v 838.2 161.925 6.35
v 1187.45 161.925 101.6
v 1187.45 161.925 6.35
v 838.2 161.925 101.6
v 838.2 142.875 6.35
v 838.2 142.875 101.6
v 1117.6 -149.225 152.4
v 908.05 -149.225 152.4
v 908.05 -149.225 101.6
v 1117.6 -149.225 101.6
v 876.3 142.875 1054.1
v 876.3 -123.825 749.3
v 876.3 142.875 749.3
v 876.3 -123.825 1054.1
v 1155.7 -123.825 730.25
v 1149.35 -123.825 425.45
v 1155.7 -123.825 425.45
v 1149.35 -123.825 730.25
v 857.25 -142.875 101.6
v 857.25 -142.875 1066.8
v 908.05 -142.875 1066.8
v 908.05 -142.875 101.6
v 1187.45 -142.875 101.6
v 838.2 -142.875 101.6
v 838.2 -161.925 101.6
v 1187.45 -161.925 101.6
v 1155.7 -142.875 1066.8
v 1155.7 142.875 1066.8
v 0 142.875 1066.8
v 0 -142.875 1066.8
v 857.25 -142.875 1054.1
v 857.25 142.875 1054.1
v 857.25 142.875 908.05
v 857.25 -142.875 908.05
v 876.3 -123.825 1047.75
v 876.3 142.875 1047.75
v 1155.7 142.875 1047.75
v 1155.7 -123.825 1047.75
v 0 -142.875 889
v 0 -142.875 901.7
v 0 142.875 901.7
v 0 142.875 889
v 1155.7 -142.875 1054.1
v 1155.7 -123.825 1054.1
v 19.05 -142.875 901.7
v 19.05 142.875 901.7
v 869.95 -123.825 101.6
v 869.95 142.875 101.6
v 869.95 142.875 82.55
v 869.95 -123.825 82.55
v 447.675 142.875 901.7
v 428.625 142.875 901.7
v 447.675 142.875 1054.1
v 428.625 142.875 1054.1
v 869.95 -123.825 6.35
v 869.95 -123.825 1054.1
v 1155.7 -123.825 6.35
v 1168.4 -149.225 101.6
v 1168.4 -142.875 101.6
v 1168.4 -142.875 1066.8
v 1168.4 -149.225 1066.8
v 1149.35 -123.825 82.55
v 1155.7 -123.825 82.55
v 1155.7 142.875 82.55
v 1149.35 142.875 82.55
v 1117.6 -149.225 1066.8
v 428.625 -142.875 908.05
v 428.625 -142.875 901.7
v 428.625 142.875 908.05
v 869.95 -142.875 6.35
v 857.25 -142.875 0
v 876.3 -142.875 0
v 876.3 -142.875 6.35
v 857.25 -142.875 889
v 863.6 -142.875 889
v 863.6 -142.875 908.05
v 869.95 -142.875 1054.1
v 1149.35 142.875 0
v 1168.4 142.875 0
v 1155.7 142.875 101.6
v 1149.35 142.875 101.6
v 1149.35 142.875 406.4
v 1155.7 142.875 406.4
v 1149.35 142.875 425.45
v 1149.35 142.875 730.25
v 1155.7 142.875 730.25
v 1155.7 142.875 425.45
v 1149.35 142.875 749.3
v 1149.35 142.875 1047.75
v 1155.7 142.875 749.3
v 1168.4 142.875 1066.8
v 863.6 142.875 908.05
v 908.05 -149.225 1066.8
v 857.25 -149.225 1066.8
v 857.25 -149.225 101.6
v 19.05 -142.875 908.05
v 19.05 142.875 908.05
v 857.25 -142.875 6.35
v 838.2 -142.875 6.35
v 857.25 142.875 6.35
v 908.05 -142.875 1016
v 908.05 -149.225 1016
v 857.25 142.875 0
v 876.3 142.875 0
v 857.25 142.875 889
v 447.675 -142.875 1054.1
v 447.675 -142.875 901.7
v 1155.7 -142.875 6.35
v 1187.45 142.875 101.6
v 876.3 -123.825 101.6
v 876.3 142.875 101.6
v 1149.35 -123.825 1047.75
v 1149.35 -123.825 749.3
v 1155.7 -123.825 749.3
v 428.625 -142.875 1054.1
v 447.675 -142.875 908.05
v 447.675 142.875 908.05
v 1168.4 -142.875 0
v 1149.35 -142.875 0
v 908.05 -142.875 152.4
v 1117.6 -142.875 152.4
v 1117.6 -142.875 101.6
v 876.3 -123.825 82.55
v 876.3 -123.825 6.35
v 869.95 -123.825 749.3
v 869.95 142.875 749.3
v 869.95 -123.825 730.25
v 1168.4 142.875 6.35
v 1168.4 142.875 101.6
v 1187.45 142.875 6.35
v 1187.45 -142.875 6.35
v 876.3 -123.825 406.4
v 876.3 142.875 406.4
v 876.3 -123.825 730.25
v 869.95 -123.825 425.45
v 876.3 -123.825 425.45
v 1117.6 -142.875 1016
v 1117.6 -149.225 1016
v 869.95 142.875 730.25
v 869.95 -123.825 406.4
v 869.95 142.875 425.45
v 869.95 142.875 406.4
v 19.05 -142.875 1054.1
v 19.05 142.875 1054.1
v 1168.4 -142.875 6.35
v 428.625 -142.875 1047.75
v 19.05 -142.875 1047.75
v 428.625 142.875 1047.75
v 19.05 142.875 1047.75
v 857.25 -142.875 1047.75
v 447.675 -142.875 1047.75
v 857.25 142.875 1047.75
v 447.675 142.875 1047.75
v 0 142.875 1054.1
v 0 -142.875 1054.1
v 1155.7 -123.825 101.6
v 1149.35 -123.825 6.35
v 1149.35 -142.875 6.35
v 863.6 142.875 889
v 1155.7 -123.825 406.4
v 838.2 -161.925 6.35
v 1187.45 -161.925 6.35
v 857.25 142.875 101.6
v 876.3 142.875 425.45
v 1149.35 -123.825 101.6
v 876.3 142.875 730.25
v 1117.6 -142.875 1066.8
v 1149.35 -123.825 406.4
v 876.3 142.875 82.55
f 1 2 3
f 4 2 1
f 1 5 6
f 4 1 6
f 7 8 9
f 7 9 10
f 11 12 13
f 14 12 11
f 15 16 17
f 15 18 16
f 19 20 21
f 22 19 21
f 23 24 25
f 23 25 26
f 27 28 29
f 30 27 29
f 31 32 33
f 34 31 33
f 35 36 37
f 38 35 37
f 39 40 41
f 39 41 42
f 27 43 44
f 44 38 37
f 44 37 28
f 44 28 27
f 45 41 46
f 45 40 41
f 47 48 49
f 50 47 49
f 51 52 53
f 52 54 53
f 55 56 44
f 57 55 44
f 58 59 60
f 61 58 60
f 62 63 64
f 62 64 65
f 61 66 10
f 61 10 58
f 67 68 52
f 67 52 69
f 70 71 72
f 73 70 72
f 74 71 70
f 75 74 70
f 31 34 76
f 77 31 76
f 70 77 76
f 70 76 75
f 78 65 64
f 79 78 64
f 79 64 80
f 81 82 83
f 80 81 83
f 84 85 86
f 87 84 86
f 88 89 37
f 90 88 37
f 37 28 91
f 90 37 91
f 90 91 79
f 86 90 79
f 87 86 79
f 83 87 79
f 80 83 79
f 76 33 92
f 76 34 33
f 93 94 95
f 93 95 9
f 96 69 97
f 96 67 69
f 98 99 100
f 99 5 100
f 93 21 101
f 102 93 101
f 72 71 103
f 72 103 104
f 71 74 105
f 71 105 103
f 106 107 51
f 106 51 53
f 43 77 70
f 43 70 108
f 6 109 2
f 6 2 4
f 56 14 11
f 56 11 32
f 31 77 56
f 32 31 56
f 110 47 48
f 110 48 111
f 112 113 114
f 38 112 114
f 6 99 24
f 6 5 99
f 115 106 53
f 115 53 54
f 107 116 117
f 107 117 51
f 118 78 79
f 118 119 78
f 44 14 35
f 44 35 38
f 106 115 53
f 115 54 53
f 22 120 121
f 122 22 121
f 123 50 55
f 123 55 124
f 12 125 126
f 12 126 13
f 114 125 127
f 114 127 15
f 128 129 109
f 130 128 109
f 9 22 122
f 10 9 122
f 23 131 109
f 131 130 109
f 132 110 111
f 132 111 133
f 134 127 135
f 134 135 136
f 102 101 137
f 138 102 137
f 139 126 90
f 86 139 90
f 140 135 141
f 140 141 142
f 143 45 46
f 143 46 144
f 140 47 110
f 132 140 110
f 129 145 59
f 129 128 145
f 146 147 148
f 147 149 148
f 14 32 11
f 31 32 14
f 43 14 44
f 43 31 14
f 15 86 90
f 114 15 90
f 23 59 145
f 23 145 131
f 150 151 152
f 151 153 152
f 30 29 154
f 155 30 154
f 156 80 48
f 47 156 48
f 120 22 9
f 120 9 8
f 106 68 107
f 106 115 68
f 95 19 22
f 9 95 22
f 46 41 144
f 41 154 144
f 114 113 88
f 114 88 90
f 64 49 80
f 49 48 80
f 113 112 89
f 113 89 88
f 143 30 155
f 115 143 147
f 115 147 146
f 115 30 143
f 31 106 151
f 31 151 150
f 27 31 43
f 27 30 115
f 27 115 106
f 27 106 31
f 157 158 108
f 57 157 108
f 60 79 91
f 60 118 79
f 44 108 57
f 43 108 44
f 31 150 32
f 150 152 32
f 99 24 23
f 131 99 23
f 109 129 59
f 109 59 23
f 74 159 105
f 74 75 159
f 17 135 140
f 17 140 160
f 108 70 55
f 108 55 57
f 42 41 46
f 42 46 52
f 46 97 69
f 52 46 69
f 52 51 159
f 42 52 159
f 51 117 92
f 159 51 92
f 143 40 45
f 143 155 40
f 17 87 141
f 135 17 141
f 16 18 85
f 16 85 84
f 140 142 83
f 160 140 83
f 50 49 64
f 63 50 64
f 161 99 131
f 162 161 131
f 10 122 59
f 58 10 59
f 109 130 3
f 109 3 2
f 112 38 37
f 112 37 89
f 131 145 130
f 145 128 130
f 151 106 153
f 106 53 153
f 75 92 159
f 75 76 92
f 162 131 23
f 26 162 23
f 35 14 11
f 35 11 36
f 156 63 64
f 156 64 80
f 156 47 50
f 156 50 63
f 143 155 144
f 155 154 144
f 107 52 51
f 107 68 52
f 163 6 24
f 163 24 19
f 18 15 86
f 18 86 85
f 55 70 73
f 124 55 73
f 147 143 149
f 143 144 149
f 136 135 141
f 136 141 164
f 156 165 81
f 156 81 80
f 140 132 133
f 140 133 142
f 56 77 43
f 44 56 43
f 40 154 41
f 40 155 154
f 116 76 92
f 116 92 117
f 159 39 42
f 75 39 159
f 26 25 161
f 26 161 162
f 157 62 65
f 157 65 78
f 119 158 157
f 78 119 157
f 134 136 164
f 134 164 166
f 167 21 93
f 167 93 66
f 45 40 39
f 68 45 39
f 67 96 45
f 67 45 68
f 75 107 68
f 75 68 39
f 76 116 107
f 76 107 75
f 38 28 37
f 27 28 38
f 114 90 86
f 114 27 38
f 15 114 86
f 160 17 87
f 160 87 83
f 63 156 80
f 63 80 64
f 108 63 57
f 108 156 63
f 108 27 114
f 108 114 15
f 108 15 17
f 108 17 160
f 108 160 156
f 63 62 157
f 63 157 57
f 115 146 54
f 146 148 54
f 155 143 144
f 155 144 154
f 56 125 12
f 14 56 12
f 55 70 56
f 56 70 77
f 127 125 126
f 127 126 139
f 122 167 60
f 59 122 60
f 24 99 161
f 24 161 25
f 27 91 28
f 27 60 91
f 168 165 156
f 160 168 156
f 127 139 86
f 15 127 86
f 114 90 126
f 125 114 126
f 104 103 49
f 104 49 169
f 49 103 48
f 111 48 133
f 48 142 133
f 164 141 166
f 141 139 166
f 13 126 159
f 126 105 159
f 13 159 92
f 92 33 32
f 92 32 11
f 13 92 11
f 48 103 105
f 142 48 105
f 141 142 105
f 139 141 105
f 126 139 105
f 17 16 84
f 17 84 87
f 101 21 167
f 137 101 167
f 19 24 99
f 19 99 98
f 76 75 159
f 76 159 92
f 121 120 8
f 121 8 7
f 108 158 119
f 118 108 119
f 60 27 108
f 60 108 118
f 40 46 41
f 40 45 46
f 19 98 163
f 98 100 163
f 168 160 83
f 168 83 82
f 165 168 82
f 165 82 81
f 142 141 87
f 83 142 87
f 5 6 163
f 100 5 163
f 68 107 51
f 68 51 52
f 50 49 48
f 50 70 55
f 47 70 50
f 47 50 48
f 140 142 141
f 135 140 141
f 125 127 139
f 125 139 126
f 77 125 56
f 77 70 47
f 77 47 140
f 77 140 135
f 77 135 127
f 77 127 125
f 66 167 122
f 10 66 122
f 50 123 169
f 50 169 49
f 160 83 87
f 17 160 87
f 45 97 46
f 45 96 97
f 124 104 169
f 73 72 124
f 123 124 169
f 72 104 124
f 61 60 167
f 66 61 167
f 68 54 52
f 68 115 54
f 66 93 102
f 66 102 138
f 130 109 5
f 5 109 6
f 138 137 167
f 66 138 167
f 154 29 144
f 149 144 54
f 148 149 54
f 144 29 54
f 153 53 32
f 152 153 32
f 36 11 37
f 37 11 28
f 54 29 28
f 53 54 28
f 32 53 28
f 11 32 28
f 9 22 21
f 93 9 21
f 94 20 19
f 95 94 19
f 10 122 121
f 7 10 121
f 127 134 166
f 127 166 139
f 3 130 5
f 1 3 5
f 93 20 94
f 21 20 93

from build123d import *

# Parameters (mm, degrees)
F0_W          = 19.05
F0_H          = 95.25
F1_DEPTH      = 142.875
F2_DEPTH      = 142.875
F2_DEPTH_BACK = 142.875
F3_W          = 349.25
F3_H          = 95.25
F4_DEPTH      = 19.05
F5_W          = 349.25
F5_H          = 95.25
F6_DEPTH      = 19.05
F8_W          = 285.75
F8_H          = 1047.75
F9_DEPTH      = 19.05
F10_DEPTH     = 19.05
F11_W         = 209.55
F11_H         = 50.8
F11_H_2       = 12.7
F11_H_3       = 38.1
F12_DEPTH     = 6.35
F11_W_2       = 50.8
F11_W_3       = 38.1
F13_DEPTH     = 6.35


with BuildPart() as f1:
    # F0 (on Front) → F1 (new body, symmetric)
    with BuildSketch(Plane.XZ):
        with Locations((847.725, 53.975)):
            Rectangle(F0_W, F0_H)
        Polygon((869.95, 82.55), (876.3, 82.55), (1149.35, 82.55), (1155.7, 82.55), (1155.7, 101.6), (1149.35, 101.6), (876.3, 101.6), (869.95, 101.6), align=None)
        with Locations((1177.925, 53.975)):
            Rectangle(F0_W, F0_H)
        Polygon((1155.7, 425.45), (1149.35, 425.45), (876.3, 425.45), (869.95, 425.45), (869.95, 406.4), (876.3, 406.4), (1149.35, 406.4), (1155.7, 406.4), align=None)
        Polygon((1155.7, 749.3), (1149.35, 749.3), (876.3, 749.3), (869.95, 749.3), (869.95, 730.25), (876.3, 730.25), (1149.35, 730.25), (1155.7, 730.25), align=None)
        Polygon((0, 1066.8), (0, 1054.1), (19.05, 1054.1), (19.05, 1047.75), (428.625, 1047.75), (428.625, 1054.1), (447.675, 1054.1), (447.675, 1047.75), (857.25, 1047.75), (857.25, 1054.1), (876.3, 1054.1), (876.3, 1047.75), (1149.35, 1047.75), (1155.7, 1047.75), (1155.7, 1066.8), align=None)
        Polygon((19.05, 901.7), (0, 901.7), (0, 889), (857.25, 889), (863.6, 889), (863.6, 908.05), (857.25, 908.05), (447.675, 908.05), (447.675, 901.7), (428.625, 901.7), (428.625, 908.05), (19.05, 908.05), align=None)
    extrude(amount=F1_DEPTH, both=True)


with BuildPart() as f2:
    # F0 (on Front) → F2 (new body, two sides)
    with BuildSketch(Plane.XZ) as f2_sk:
        Polygon((863.6, 889), (857.25, 889), (857.25, 101.6), (857.25, 6.35), (857.25, 0), (876.3, 0), (876.3, 82.55), (869.95, 82.55), (869.95, 101.6), (876.3, 101.6), (876.3, 406.4), (869.95, 406.4), (869.95, 425.45), (876.3, 425.45), (876.3, 730.25), (869.95, 730.25), (869.95, 749.3), (876.3, 749.3), (876.3, 1047.75), (876.3, 1054.1), (857.25, 1054.1), (857.25, 1047.75), (857.25, 908.05), (863.6, 908.05), align=None)
        Polygon((1168.4, 1066.8), (1155.7, 1066.8), (1155.7, 1047.75), (1149.35, 1047.75), (1149.35, 749.3), (1155.7, 749.3), (1155.7, 730.25), (1149.35, 730.25), (1149.35, 425.45), (1155.7, 425.45), (1155.7, 406.4), (1149.35, 406.4), (1149.35, 101.6), (1155.7, 101.6), (1155.7, 82.55), (1149.35, 82.55), (1149.35, 0), (1168.4, 0), (1168.4, 6.35), (1168.4, 101.6), (1168.4, 1047.75), align=None)
        Polygon((428.625, 1047.75), (428.625, 908.05), (428.625, 901.7), (447.675, 901.7), (447.675, 908.05), (447.675, 1047.75), (447.675, 1054.1), (428.625, 1054.1), align=None)
        Polygon((0, 1047.75), (0, 908.05), (0, 901.7), (19.05, 901.7), (19.05, 908.05), (19.05, 1047.75), (19.05, 1054.1), (0, 1054.1), align=None)
    extrude(amount=F2_DEPTH)
    extrude(f2_sk.sketch, amount=-F2_DEPTH_BACK)


with BuildPart() as f4:
    # F3 (on face) → F4 (new body)
    with BuildSketch(Plane.XZ.offset(142.875)):
        with Locations((1012.825, 53.975)):
            Rectangle(F3_W, F3_H)
    extrude(amount=F4_DEPTH)


with BuildPart() as f6:
    # F5 (on face) → F6 (new body)
    with BuildSketch(Plane(origin=(0, 142.875, 0), x_dir=(-1, 0, 0), z_dir=(0, 1, 0))):
        with Locations((-1012.825, 53.975)):
            Rectangle(F5_W, F5_H)
    extrude(amount=F6_DEPTH)


with BuildPart() as f9_tool:
    # F8 (on face) → F9 (new body)
    with BuildSketch(Plane.XZ.offset(142.875)):
        with Locations((1012.825, 530.225)):
            Rectangle(F8_W, F8_H)
    extrude(amount=-F9_DEPTH)


with BuildPart() as f1_1:
    add(f1.part)

    # F9: cut by f9_tool
    add(f9_tool.part, mode=Mode.SUBTRACT)


with BuildPart() as f2_1:
    add(f2.part)

    # F9: cut by f9_tool
    add(f9_tool.part, mode=Mode.SUBTRACT)


with BuildPart() as f10:
    # F8 (on face) → F10 (new body)
    with BuildSketch(Plane.XZ.offset(142.875)):
        with Locations((1012.825, 530.225)):
            Rectangle(F8_W, F8_H)
    extrude(amount=-F10_DEPTH)


with BuildPart() as f12:
    # F11 (on face) → F12 (new body)
    with BuildSketch(Plane.XZ.offset(142.875)):
        with Locations((1012.825, 127)):
            Rectangle(F11_W, F11_H)
        with Locations((1012.825, 1060.45)):
            Rectangle(F11_W, F11_H_2)
        with Locations((1012.825, 1035.05)):
            Rectangle(F11_W, F11_H_3)
    extrude(amount=F12_DEPTH)


with BuildPart() as f13:
    # F11 (on face) → F13 (new body, through all)
    with BuildSketch(Plane.XZ.offset(142.875)):
        with Locations((882.65, 1060.45)):
            Rectangle(F11_W_2, F11_H_2)
        with Locations((1136.65, 1060.45)):
            Rectangle(F11_W_3, F11_H_2)
        Polygon((908.05, 1054.1), (857.25, 1054.1), (857.25, 1047.75), (857.25, 101.6), (908.05, 101.6), (908.05, 152.4), (908.05, 1016), align=None)
        Polygon((1155.7, 1054.1), (1117.6, 1054.1), (1117.6, 1016), (1117.6, 152.4), (1117.6, 101.6), (1168.4, 101.6), (1168.4, 1066.8), (1155.7, 1066.8), align=None)
    extrude(amount=F13_DEPTH)


solid = Compound([f4.part, f6.part, f1_1.part, f2_1.part, f10.part, f12.part, f13.part])
